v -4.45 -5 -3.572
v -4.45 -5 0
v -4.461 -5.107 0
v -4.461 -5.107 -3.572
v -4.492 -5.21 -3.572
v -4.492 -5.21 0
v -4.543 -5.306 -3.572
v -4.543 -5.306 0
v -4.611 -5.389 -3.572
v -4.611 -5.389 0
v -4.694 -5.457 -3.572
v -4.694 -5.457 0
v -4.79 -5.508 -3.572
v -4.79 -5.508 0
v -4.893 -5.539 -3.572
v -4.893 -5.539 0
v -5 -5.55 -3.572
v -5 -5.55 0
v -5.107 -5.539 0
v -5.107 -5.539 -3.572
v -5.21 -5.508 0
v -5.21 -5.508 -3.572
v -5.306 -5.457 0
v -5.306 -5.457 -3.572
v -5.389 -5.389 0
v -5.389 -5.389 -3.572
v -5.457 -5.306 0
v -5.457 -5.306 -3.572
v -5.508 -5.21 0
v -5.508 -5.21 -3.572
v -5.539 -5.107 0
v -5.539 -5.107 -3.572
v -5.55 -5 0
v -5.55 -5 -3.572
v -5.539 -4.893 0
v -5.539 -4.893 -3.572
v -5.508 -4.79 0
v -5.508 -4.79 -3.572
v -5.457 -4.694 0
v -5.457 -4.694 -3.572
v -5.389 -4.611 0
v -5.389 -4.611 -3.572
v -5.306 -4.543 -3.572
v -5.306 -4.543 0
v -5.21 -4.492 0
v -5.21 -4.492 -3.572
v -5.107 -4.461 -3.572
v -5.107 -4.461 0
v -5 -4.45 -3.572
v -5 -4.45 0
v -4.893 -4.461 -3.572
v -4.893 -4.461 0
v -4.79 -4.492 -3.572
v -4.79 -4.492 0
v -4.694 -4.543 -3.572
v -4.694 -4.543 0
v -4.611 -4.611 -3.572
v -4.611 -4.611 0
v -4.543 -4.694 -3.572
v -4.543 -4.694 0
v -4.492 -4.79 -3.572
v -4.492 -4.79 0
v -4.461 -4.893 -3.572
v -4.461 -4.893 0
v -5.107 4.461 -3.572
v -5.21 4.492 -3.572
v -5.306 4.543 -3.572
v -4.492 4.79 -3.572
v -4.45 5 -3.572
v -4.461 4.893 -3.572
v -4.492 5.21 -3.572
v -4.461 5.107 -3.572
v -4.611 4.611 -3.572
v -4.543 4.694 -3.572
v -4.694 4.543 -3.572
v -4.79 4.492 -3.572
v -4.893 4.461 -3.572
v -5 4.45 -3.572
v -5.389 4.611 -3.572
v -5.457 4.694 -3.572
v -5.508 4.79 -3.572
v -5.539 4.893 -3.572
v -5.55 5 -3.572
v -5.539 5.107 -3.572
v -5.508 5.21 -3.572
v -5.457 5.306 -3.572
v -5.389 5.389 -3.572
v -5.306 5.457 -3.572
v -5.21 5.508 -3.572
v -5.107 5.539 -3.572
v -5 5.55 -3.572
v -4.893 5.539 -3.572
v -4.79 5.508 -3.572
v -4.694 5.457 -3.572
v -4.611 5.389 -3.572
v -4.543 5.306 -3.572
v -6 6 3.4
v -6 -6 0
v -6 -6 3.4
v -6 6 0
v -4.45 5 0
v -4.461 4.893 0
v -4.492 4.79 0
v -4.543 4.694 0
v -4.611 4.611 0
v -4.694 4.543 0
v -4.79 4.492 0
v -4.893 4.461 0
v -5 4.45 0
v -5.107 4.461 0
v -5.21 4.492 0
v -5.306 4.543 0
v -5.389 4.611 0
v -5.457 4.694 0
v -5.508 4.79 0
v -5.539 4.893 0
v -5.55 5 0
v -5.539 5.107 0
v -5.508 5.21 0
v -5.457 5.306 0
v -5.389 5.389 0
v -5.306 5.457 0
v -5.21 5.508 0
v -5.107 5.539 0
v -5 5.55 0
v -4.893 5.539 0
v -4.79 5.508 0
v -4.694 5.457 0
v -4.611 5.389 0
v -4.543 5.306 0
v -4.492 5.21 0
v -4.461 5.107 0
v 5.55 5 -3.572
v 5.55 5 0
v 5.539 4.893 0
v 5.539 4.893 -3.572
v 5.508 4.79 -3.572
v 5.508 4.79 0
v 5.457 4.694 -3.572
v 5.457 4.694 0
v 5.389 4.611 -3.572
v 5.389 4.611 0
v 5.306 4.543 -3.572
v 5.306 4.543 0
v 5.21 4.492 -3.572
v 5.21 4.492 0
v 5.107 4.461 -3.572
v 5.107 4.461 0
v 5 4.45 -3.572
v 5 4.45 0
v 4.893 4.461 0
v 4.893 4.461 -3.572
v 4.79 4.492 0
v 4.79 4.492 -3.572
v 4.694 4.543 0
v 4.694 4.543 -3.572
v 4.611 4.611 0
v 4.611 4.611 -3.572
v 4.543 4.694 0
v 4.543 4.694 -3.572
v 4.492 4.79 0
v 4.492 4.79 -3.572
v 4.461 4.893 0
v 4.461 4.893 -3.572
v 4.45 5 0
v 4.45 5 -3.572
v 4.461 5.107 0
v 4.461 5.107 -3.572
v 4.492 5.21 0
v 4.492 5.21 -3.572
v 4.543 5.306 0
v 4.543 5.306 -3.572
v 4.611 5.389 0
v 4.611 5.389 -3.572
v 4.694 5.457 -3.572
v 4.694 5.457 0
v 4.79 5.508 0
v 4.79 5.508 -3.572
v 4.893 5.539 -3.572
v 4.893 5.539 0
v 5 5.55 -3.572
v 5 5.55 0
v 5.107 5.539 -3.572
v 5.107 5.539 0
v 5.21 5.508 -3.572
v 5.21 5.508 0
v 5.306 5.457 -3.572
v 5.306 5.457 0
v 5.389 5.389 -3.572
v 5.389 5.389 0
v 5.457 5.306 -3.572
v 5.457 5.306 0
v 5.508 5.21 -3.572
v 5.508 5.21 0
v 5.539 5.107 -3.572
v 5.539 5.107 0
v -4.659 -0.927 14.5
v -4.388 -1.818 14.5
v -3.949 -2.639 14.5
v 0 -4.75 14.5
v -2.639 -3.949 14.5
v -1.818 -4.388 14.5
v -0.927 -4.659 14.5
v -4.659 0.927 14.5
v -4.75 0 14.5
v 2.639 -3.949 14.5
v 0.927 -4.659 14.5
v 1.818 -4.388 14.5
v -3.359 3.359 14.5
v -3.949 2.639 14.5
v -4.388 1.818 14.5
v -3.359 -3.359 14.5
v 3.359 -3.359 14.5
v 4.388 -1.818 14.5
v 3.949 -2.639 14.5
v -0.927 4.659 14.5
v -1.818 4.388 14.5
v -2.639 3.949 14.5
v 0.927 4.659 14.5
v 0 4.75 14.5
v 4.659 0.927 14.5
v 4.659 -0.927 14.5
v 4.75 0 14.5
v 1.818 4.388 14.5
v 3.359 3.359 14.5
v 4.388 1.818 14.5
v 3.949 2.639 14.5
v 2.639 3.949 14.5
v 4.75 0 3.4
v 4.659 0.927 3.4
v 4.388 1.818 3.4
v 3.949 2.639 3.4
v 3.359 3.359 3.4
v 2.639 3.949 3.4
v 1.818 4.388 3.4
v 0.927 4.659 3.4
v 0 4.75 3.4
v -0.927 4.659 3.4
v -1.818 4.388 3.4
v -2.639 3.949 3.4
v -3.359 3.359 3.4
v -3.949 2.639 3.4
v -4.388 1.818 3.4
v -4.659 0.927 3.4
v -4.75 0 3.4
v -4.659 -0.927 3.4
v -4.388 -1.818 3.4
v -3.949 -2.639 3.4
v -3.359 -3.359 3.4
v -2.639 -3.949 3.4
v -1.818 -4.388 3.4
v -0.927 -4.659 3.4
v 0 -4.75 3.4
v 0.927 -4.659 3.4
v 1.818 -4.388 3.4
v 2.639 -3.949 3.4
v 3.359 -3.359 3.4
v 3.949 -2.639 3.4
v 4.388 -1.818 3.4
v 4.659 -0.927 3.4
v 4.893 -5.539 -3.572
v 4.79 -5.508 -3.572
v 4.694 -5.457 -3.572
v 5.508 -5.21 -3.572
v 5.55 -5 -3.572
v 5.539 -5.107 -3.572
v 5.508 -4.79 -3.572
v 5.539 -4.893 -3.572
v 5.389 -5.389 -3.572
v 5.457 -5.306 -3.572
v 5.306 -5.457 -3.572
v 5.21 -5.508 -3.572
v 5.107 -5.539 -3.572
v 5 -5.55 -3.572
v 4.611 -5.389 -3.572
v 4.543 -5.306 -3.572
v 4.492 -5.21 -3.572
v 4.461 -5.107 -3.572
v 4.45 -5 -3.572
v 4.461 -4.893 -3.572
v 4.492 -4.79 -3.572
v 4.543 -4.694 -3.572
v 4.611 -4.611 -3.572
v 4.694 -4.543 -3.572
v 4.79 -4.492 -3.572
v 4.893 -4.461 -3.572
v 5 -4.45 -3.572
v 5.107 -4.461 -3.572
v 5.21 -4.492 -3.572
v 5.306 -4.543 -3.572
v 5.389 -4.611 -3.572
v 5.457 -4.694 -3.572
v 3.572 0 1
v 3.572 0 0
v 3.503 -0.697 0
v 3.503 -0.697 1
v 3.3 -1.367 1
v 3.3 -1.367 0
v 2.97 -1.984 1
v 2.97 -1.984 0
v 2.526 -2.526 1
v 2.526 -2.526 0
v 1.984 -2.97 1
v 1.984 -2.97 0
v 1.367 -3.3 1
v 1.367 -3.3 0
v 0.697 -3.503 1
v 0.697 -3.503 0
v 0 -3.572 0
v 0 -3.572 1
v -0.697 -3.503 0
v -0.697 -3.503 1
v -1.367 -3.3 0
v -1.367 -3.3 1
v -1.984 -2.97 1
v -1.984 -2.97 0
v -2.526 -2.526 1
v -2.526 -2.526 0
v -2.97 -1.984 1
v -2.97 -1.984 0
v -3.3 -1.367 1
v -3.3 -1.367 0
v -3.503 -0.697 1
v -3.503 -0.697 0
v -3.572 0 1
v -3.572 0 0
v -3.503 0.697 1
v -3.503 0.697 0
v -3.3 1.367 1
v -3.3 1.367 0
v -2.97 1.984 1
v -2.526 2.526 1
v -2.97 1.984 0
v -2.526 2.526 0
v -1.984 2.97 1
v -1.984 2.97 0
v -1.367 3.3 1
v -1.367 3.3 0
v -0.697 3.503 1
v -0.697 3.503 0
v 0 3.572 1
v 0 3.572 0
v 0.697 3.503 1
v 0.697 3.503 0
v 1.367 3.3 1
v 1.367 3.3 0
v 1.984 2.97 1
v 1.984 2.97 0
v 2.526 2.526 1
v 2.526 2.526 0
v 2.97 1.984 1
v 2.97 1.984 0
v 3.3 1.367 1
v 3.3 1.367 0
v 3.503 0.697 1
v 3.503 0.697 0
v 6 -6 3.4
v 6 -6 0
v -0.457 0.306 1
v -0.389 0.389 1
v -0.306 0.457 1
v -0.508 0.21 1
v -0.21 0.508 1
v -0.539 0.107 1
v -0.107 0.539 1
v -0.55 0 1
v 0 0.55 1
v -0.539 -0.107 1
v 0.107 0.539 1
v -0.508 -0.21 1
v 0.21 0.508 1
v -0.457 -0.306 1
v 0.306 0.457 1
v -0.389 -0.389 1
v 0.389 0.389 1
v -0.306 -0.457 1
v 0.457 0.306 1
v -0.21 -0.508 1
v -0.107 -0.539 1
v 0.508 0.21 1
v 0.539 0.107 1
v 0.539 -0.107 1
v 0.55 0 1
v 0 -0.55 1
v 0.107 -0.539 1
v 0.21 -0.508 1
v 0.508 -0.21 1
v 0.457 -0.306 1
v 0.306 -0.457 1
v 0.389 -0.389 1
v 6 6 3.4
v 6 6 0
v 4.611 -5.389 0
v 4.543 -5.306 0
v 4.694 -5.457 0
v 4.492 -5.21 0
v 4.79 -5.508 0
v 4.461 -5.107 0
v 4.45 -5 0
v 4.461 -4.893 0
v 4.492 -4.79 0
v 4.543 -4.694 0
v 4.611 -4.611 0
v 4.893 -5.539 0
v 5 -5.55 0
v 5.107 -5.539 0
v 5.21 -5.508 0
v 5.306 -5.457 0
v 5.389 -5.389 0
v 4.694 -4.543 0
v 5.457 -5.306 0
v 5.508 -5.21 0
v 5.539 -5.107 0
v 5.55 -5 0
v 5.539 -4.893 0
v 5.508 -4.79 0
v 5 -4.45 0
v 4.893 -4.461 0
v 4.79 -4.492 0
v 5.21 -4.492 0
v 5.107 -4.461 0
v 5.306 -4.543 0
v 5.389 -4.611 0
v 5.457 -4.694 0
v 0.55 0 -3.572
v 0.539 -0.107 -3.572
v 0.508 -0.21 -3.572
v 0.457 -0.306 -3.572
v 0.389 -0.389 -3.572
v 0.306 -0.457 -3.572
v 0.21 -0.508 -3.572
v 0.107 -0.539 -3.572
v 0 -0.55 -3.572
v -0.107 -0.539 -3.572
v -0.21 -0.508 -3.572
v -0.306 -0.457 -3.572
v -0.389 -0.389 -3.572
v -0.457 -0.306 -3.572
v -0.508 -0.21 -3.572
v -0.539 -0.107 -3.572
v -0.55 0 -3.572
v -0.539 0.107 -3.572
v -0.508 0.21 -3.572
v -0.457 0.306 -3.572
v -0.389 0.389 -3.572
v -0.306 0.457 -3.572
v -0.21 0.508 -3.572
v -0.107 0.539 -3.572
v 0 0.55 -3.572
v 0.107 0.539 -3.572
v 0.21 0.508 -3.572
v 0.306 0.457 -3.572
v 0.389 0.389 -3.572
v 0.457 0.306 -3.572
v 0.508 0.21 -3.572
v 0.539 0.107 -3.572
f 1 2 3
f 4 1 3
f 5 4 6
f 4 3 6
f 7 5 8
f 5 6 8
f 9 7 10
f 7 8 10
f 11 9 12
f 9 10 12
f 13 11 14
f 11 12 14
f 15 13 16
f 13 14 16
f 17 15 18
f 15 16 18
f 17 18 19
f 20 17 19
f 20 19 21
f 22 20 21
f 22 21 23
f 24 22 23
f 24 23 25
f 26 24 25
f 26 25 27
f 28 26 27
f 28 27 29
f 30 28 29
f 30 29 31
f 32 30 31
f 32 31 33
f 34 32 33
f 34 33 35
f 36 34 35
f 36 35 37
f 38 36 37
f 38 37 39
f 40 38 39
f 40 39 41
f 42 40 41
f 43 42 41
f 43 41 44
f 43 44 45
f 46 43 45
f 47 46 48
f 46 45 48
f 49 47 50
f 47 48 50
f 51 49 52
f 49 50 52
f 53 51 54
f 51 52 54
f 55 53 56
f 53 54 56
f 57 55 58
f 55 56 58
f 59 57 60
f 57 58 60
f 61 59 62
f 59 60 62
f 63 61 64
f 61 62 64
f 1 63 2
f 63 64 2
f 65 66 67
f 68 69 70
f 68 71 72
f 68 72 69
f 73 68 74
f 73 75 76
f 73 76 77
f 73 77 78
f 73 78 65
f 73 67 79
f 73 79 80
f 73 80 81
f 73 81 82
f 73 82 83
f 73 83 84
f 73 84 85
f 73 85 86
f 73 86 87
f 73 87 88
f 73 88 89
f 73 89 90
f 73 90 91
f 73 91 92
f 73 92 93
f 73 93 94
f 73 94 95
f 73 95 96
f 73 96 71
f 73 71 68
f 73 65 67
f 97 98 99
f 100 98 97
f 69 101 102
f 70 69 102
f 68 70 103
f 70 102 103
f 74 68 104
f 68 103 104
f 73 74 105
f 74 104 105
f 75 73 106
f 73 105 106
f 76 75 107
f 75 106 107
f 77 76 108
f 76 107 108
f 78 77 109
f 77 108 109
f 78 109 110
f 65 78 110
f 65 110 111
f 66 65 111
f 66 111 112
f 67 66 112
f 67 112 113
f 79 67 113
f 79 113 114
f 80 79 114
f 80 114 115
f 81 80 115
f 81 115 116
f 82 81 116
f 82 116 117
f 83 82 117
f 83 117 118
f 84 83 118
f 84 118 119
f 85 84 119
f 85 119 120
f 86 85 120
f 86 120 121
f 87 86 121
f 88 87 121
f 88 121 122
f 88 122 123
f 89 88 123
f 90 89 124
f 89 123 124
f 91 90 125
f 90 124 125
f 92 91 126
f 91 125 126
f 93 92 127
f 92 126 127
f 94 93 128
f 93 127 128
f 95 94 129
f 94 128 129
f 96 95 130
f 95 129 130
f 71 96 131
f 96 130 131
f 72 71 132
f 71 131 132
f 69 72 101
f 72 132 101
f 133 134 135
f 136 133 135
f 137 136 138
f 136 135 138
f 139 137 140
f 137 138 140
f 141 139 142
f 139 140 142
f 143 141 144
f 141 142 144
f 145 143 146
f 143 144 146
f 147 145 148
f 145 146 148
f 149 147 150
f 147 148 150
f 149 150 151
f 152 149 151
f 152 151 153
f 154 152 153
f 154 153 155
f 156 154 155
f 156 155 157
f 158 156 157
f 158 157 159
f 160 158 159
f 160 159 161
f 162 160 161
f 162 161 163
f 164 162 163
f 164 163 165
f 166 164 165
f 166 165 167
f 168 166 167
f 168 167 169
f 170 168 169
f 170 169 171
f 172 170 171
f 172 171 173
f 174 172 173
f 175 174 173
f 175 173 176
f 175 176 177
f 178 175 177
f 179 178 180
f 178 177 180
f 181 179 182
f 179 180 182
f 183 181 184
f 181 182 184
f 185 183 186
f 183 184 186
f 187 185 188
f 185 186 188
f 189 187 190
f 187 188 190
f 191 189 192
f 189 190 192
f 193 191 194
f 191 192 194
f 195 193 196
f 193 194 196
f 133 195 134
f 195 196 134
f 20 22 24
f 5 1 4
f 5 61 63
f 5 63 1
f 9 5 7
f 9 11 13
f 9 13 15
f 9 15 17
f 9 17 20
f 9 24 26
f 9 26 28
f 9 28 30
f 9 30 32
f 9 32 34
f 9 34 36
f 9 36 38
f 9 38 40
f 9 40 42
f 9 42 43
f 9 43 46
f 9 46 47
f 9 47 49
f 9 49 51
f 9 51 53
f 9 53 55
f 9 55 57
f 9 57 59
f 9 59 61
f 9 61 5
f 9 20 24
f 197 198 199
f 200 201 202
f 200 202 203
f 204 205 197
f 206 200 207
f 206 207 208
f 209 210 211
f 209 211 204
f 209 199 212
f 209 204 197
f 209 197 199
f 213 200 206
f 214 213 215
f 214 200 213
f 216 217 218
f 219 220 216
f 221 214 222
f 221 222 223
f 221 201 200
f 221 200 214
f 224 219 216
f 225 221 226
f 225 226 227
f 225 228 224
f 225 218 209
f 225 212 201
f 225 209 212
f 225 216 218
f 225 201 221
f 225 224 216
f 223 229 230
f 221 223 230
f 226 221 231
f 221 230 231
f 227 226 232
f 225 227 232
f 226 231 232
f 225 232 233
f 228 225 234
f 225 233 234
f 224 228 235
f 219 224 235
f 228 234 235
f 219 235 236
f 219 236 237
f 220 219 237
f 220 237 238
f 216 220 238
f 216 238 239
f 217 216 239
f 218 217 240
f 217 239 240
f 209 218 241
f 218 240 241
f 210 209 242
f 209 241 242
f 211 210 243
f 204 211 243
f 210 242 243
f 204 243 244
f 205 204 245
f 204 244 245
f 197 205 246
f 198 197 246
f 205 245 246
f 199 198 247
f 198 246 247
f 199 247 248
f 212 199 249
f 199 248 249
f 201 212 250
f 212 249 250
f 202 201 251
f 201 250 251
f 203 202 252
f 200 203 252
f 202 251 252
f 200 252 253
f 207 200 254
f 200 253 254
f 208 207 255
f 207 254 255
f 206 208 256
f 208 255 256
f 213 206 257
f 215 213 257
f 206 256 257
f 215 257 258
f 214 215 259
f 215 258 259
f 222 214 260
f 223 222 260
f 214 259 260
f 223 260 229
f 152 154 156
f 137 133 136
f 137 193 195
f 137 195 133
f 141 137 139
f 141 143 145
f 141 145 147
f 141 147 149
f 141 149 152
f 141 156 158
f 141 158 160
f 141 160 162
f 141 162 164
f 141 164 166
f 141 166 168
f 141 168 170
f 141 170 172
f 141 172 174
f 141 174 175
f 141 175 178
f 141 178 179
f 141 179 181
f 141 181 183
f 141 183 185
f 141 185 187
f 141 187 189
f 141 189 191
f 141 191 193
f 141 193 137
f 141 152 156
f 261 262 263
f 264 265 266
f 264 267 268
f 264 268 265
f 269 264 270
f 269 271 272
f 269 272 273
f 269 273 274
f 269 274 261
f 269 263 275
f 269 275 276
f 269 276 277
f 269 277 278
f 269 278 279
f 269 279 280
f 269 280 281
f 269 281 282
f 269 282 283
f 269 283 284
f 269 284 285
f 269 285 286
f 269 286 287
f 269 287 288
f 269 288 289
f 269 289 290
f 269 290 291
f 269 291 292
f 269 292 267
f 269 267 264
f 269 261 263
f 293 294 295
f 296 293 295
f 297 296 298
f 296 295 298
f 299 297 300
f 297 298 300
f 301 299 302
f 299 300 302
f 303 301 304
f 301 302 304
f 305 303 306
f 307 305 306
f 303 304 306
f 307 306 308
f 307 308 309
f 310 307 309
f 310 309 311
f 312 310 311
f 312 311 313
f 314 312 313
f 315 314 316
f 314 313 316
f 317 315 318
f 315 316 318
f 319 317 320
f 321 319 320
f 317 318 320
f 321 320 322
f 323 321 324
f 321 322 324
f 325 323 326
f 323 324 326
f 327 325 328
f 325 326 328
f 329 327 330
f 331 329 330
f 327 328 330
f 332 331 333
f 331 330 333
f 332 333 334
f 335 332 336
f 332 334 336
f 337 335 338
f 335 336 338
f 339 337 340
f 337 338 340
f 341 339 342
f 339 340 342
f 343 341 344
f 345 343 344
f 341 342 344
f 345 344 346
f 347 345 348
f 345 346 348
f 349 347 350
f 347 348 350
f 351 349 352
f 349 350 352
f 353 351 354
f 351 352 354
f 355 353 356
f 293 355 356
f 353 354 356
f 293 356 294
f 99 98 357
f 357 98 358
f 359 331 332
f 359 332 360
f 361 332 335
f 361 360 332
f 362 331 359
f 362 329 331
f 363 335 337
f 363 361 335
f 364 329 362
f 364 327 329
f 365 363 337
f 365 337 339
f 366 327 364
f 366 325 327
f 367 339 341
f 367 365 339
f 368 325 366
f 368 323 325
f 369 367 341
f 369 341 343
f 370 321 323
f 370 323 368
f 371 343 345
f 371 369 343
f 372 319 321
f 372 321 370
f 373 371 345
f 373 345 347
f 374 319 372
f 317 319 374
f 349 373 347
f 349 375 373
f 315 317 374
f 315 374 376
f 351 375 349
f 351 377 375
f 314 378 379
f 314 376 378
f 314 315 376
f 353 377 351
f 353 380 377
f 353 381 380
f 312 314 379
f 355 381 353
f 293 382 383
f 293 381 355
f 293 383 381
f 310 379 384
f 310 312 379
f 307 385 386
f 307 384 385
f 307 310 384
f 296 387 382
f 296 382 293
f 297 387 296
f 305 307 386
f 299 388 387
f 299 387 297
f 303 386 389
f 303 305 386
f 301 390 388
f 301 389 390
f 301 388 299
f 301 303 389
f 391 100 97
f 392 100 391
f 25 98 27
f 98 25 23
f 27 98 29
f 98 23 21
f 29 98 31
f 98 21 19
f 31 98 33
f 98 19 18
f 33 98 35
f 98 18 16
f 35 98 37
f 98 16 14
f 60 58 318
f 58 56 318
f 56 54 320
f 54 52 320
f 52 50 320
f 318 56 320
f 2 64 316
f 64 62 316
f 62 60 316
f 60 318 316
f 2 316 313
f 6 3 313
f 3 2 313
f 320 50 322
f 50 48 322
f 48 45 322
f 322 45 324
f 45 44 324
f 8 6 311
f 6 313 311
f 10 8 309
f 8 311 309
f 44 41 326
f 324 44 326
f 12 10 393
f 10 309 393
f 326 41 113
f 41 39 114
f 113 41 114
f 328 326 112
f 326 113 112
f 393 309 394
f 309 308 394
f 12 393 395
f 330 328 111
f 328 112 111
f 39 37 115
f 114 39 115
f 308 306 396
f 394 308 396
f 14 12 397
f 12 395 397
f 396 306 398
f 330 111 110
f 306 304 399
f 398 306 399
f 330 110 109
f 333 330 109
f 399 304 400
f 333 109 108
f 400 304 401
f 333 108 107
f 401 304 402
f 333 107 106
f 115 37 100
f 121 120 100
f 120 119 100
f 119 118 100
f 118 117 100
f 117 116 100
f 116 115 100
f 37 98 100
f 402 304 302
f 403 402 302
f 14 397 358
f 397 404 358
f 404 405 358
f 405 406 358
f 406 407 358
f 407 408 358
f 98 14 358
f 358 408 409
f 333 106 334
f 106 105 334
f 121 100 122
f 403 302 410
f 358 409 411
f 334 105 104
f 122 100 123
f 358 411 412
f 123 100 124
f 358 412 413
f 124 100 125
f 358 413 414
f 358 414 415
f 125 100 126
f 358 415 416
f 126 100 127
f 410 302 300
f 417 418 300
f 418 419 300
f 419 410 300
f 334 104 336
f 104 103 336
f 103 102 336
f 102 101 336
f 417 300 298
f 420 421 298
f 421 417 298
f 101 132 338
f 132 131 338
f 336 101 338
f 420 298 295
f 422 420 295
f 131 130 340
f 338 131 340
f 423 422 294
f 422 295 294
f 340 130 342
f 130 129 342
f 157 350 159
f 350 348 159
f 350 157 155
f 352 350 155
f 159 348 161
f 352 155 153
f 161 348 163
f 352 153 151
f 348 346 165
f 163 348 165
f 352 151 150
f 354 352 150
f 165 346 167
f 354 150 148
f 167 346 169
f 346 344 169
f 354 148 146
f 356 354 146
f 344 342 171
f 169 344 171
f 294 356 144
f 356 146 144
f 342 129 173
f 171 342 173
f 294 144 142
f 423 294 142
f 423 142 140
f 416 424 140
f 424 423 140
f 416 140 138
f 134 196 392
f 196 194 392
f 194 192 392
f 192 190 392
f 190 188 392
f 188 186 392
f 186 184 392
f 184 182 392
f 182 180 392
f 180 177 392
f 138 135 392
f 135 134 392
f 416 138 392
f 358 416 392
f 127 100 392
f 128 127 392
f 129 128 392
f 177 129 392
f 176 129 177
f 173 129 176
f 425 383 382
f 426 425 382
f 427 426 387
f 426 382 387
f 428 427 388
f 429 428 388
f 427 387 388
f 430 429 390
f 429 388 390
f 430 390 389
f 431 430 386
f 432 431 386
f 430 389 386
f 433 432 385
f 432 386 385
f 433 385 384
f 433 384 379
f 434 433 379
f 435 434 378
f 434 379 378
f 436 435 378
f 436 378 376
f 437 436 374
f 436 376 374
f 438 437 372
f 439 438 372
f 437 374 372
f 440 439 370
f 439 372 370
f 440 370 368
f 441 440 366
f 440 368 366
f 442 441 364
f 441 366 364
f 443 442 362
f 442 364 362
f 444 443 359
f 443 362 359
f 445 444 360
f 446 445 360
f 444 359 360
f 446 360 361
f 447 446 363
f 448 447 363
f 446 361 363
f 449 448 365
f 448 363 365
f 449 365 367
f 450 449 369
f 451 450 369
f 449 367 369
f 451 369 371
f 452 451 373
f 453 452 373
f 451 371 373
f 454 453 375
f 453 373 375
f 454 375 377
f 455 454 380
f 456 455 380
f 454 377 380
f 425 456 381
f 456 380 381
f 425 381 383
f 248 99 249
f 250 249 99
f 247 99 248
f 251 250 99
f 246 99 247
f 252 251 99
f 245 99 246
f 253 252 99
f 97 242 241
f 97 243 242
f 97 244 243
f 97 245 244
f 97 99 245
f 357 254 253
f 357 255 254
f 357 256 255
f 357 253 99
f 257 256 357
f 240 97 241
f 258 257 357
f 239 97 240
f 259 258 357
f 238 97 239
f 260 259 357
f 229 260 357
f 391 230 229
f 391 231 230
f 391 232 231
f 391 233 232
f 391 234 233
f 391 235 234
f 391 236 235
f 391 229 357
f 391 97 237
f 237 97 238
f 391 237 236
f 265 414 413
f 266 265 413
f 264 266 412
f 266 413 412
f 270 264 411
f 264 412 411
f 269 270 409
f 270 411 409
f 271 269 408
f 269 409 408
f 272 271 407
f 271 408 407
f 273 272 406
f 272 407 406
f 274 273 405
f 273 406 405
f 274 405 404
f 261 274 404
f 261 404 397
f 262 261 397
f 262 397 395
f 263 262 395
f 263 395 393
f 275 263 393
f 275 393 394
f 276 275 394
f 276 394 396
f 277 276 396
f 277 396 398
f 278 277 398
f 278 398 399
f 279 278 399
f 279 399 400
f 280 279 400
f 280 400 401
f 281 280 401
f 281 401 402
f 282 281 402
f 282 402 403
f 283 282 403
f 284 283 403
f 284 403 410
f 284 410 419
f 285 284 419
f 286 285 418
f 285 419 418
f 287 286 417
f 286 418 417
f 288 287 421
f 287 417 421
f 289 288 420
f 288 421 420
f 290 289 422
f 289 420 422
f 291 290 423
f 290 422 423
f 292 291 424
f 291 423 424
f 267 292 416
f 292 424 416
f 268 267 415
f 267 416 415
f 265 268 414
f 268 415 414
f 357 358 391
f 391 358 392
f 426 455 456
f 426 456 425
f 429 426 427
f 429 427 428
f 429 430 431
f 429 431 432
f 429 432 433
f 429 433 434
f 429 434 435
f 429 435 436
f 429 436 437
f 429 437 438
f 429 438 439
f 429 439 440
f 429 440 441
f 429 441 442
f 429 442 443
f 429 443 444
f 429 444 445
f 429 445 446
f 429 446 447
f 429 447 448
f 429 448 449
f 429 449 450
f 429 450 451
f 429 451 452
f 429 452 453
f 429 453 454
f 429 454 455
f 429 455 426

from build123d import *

# Parameters (mm, degrees)
SKETCH_W     = 12
SKETCH_H     = 12
PAD_DEPTH    = 3.4
SKETCH001_R  = 4.75
PAD001_DEPTH = 11.1
SKETCH002_R  = 3.571924
POCKET_DEPTH = 1
SKETCH003_R  = 0.55
PAD002_DEPTH = 4.572


with BuildPart() as part:
    # Sketch → Pad (new body)
    with BuildSketch(Plane.XY):
        Rectangle(SKETCH_W, SKETCH_H)
    extrude(amount=PAD_DEPTH)

    # Sketch001 (on Face6 of Pad) → Pad001 (join)
    with BuildSketch(Plane.XY.offset(3.4)):
        Circle(SKETCH001_R)
    extrude(amount=PAD001_DEPTH)

    # Sketch002 (on Face4 of Pad001) → Pocket (cut)
    with BuildSketch(Plane(origin=(0, 0, 0), x_dir=(1, 0, 0), z_dir=(0, 0, -1))):
        Circle(SKETCH002_R)
    extrude(amount=-POCKET_DEPTH, mode=Mode.SUBTRACT)

    # Sketch003 (on Face9 of Pocket) → Pad002 (join)
    with BuildSketch(Plane(origin=(0, 0, 1), x_dir=(1, 0, 0), z_dir=(0, 0, -1))):
        Circle(SKETCH003_R)
        with Locations((-5, 5)):
            Circle(SKETCH003_R)
        with Locations((5, 5)):
            Circle(SKETCH003_R)
        with Locations((5, -5)):
            Circle(SKETCH003_R)
        with Locations((-5, -5)):
            Circle(SKETCH003_R)
    extrude(amount=PAD002_DEPTH)


solid = part.part
